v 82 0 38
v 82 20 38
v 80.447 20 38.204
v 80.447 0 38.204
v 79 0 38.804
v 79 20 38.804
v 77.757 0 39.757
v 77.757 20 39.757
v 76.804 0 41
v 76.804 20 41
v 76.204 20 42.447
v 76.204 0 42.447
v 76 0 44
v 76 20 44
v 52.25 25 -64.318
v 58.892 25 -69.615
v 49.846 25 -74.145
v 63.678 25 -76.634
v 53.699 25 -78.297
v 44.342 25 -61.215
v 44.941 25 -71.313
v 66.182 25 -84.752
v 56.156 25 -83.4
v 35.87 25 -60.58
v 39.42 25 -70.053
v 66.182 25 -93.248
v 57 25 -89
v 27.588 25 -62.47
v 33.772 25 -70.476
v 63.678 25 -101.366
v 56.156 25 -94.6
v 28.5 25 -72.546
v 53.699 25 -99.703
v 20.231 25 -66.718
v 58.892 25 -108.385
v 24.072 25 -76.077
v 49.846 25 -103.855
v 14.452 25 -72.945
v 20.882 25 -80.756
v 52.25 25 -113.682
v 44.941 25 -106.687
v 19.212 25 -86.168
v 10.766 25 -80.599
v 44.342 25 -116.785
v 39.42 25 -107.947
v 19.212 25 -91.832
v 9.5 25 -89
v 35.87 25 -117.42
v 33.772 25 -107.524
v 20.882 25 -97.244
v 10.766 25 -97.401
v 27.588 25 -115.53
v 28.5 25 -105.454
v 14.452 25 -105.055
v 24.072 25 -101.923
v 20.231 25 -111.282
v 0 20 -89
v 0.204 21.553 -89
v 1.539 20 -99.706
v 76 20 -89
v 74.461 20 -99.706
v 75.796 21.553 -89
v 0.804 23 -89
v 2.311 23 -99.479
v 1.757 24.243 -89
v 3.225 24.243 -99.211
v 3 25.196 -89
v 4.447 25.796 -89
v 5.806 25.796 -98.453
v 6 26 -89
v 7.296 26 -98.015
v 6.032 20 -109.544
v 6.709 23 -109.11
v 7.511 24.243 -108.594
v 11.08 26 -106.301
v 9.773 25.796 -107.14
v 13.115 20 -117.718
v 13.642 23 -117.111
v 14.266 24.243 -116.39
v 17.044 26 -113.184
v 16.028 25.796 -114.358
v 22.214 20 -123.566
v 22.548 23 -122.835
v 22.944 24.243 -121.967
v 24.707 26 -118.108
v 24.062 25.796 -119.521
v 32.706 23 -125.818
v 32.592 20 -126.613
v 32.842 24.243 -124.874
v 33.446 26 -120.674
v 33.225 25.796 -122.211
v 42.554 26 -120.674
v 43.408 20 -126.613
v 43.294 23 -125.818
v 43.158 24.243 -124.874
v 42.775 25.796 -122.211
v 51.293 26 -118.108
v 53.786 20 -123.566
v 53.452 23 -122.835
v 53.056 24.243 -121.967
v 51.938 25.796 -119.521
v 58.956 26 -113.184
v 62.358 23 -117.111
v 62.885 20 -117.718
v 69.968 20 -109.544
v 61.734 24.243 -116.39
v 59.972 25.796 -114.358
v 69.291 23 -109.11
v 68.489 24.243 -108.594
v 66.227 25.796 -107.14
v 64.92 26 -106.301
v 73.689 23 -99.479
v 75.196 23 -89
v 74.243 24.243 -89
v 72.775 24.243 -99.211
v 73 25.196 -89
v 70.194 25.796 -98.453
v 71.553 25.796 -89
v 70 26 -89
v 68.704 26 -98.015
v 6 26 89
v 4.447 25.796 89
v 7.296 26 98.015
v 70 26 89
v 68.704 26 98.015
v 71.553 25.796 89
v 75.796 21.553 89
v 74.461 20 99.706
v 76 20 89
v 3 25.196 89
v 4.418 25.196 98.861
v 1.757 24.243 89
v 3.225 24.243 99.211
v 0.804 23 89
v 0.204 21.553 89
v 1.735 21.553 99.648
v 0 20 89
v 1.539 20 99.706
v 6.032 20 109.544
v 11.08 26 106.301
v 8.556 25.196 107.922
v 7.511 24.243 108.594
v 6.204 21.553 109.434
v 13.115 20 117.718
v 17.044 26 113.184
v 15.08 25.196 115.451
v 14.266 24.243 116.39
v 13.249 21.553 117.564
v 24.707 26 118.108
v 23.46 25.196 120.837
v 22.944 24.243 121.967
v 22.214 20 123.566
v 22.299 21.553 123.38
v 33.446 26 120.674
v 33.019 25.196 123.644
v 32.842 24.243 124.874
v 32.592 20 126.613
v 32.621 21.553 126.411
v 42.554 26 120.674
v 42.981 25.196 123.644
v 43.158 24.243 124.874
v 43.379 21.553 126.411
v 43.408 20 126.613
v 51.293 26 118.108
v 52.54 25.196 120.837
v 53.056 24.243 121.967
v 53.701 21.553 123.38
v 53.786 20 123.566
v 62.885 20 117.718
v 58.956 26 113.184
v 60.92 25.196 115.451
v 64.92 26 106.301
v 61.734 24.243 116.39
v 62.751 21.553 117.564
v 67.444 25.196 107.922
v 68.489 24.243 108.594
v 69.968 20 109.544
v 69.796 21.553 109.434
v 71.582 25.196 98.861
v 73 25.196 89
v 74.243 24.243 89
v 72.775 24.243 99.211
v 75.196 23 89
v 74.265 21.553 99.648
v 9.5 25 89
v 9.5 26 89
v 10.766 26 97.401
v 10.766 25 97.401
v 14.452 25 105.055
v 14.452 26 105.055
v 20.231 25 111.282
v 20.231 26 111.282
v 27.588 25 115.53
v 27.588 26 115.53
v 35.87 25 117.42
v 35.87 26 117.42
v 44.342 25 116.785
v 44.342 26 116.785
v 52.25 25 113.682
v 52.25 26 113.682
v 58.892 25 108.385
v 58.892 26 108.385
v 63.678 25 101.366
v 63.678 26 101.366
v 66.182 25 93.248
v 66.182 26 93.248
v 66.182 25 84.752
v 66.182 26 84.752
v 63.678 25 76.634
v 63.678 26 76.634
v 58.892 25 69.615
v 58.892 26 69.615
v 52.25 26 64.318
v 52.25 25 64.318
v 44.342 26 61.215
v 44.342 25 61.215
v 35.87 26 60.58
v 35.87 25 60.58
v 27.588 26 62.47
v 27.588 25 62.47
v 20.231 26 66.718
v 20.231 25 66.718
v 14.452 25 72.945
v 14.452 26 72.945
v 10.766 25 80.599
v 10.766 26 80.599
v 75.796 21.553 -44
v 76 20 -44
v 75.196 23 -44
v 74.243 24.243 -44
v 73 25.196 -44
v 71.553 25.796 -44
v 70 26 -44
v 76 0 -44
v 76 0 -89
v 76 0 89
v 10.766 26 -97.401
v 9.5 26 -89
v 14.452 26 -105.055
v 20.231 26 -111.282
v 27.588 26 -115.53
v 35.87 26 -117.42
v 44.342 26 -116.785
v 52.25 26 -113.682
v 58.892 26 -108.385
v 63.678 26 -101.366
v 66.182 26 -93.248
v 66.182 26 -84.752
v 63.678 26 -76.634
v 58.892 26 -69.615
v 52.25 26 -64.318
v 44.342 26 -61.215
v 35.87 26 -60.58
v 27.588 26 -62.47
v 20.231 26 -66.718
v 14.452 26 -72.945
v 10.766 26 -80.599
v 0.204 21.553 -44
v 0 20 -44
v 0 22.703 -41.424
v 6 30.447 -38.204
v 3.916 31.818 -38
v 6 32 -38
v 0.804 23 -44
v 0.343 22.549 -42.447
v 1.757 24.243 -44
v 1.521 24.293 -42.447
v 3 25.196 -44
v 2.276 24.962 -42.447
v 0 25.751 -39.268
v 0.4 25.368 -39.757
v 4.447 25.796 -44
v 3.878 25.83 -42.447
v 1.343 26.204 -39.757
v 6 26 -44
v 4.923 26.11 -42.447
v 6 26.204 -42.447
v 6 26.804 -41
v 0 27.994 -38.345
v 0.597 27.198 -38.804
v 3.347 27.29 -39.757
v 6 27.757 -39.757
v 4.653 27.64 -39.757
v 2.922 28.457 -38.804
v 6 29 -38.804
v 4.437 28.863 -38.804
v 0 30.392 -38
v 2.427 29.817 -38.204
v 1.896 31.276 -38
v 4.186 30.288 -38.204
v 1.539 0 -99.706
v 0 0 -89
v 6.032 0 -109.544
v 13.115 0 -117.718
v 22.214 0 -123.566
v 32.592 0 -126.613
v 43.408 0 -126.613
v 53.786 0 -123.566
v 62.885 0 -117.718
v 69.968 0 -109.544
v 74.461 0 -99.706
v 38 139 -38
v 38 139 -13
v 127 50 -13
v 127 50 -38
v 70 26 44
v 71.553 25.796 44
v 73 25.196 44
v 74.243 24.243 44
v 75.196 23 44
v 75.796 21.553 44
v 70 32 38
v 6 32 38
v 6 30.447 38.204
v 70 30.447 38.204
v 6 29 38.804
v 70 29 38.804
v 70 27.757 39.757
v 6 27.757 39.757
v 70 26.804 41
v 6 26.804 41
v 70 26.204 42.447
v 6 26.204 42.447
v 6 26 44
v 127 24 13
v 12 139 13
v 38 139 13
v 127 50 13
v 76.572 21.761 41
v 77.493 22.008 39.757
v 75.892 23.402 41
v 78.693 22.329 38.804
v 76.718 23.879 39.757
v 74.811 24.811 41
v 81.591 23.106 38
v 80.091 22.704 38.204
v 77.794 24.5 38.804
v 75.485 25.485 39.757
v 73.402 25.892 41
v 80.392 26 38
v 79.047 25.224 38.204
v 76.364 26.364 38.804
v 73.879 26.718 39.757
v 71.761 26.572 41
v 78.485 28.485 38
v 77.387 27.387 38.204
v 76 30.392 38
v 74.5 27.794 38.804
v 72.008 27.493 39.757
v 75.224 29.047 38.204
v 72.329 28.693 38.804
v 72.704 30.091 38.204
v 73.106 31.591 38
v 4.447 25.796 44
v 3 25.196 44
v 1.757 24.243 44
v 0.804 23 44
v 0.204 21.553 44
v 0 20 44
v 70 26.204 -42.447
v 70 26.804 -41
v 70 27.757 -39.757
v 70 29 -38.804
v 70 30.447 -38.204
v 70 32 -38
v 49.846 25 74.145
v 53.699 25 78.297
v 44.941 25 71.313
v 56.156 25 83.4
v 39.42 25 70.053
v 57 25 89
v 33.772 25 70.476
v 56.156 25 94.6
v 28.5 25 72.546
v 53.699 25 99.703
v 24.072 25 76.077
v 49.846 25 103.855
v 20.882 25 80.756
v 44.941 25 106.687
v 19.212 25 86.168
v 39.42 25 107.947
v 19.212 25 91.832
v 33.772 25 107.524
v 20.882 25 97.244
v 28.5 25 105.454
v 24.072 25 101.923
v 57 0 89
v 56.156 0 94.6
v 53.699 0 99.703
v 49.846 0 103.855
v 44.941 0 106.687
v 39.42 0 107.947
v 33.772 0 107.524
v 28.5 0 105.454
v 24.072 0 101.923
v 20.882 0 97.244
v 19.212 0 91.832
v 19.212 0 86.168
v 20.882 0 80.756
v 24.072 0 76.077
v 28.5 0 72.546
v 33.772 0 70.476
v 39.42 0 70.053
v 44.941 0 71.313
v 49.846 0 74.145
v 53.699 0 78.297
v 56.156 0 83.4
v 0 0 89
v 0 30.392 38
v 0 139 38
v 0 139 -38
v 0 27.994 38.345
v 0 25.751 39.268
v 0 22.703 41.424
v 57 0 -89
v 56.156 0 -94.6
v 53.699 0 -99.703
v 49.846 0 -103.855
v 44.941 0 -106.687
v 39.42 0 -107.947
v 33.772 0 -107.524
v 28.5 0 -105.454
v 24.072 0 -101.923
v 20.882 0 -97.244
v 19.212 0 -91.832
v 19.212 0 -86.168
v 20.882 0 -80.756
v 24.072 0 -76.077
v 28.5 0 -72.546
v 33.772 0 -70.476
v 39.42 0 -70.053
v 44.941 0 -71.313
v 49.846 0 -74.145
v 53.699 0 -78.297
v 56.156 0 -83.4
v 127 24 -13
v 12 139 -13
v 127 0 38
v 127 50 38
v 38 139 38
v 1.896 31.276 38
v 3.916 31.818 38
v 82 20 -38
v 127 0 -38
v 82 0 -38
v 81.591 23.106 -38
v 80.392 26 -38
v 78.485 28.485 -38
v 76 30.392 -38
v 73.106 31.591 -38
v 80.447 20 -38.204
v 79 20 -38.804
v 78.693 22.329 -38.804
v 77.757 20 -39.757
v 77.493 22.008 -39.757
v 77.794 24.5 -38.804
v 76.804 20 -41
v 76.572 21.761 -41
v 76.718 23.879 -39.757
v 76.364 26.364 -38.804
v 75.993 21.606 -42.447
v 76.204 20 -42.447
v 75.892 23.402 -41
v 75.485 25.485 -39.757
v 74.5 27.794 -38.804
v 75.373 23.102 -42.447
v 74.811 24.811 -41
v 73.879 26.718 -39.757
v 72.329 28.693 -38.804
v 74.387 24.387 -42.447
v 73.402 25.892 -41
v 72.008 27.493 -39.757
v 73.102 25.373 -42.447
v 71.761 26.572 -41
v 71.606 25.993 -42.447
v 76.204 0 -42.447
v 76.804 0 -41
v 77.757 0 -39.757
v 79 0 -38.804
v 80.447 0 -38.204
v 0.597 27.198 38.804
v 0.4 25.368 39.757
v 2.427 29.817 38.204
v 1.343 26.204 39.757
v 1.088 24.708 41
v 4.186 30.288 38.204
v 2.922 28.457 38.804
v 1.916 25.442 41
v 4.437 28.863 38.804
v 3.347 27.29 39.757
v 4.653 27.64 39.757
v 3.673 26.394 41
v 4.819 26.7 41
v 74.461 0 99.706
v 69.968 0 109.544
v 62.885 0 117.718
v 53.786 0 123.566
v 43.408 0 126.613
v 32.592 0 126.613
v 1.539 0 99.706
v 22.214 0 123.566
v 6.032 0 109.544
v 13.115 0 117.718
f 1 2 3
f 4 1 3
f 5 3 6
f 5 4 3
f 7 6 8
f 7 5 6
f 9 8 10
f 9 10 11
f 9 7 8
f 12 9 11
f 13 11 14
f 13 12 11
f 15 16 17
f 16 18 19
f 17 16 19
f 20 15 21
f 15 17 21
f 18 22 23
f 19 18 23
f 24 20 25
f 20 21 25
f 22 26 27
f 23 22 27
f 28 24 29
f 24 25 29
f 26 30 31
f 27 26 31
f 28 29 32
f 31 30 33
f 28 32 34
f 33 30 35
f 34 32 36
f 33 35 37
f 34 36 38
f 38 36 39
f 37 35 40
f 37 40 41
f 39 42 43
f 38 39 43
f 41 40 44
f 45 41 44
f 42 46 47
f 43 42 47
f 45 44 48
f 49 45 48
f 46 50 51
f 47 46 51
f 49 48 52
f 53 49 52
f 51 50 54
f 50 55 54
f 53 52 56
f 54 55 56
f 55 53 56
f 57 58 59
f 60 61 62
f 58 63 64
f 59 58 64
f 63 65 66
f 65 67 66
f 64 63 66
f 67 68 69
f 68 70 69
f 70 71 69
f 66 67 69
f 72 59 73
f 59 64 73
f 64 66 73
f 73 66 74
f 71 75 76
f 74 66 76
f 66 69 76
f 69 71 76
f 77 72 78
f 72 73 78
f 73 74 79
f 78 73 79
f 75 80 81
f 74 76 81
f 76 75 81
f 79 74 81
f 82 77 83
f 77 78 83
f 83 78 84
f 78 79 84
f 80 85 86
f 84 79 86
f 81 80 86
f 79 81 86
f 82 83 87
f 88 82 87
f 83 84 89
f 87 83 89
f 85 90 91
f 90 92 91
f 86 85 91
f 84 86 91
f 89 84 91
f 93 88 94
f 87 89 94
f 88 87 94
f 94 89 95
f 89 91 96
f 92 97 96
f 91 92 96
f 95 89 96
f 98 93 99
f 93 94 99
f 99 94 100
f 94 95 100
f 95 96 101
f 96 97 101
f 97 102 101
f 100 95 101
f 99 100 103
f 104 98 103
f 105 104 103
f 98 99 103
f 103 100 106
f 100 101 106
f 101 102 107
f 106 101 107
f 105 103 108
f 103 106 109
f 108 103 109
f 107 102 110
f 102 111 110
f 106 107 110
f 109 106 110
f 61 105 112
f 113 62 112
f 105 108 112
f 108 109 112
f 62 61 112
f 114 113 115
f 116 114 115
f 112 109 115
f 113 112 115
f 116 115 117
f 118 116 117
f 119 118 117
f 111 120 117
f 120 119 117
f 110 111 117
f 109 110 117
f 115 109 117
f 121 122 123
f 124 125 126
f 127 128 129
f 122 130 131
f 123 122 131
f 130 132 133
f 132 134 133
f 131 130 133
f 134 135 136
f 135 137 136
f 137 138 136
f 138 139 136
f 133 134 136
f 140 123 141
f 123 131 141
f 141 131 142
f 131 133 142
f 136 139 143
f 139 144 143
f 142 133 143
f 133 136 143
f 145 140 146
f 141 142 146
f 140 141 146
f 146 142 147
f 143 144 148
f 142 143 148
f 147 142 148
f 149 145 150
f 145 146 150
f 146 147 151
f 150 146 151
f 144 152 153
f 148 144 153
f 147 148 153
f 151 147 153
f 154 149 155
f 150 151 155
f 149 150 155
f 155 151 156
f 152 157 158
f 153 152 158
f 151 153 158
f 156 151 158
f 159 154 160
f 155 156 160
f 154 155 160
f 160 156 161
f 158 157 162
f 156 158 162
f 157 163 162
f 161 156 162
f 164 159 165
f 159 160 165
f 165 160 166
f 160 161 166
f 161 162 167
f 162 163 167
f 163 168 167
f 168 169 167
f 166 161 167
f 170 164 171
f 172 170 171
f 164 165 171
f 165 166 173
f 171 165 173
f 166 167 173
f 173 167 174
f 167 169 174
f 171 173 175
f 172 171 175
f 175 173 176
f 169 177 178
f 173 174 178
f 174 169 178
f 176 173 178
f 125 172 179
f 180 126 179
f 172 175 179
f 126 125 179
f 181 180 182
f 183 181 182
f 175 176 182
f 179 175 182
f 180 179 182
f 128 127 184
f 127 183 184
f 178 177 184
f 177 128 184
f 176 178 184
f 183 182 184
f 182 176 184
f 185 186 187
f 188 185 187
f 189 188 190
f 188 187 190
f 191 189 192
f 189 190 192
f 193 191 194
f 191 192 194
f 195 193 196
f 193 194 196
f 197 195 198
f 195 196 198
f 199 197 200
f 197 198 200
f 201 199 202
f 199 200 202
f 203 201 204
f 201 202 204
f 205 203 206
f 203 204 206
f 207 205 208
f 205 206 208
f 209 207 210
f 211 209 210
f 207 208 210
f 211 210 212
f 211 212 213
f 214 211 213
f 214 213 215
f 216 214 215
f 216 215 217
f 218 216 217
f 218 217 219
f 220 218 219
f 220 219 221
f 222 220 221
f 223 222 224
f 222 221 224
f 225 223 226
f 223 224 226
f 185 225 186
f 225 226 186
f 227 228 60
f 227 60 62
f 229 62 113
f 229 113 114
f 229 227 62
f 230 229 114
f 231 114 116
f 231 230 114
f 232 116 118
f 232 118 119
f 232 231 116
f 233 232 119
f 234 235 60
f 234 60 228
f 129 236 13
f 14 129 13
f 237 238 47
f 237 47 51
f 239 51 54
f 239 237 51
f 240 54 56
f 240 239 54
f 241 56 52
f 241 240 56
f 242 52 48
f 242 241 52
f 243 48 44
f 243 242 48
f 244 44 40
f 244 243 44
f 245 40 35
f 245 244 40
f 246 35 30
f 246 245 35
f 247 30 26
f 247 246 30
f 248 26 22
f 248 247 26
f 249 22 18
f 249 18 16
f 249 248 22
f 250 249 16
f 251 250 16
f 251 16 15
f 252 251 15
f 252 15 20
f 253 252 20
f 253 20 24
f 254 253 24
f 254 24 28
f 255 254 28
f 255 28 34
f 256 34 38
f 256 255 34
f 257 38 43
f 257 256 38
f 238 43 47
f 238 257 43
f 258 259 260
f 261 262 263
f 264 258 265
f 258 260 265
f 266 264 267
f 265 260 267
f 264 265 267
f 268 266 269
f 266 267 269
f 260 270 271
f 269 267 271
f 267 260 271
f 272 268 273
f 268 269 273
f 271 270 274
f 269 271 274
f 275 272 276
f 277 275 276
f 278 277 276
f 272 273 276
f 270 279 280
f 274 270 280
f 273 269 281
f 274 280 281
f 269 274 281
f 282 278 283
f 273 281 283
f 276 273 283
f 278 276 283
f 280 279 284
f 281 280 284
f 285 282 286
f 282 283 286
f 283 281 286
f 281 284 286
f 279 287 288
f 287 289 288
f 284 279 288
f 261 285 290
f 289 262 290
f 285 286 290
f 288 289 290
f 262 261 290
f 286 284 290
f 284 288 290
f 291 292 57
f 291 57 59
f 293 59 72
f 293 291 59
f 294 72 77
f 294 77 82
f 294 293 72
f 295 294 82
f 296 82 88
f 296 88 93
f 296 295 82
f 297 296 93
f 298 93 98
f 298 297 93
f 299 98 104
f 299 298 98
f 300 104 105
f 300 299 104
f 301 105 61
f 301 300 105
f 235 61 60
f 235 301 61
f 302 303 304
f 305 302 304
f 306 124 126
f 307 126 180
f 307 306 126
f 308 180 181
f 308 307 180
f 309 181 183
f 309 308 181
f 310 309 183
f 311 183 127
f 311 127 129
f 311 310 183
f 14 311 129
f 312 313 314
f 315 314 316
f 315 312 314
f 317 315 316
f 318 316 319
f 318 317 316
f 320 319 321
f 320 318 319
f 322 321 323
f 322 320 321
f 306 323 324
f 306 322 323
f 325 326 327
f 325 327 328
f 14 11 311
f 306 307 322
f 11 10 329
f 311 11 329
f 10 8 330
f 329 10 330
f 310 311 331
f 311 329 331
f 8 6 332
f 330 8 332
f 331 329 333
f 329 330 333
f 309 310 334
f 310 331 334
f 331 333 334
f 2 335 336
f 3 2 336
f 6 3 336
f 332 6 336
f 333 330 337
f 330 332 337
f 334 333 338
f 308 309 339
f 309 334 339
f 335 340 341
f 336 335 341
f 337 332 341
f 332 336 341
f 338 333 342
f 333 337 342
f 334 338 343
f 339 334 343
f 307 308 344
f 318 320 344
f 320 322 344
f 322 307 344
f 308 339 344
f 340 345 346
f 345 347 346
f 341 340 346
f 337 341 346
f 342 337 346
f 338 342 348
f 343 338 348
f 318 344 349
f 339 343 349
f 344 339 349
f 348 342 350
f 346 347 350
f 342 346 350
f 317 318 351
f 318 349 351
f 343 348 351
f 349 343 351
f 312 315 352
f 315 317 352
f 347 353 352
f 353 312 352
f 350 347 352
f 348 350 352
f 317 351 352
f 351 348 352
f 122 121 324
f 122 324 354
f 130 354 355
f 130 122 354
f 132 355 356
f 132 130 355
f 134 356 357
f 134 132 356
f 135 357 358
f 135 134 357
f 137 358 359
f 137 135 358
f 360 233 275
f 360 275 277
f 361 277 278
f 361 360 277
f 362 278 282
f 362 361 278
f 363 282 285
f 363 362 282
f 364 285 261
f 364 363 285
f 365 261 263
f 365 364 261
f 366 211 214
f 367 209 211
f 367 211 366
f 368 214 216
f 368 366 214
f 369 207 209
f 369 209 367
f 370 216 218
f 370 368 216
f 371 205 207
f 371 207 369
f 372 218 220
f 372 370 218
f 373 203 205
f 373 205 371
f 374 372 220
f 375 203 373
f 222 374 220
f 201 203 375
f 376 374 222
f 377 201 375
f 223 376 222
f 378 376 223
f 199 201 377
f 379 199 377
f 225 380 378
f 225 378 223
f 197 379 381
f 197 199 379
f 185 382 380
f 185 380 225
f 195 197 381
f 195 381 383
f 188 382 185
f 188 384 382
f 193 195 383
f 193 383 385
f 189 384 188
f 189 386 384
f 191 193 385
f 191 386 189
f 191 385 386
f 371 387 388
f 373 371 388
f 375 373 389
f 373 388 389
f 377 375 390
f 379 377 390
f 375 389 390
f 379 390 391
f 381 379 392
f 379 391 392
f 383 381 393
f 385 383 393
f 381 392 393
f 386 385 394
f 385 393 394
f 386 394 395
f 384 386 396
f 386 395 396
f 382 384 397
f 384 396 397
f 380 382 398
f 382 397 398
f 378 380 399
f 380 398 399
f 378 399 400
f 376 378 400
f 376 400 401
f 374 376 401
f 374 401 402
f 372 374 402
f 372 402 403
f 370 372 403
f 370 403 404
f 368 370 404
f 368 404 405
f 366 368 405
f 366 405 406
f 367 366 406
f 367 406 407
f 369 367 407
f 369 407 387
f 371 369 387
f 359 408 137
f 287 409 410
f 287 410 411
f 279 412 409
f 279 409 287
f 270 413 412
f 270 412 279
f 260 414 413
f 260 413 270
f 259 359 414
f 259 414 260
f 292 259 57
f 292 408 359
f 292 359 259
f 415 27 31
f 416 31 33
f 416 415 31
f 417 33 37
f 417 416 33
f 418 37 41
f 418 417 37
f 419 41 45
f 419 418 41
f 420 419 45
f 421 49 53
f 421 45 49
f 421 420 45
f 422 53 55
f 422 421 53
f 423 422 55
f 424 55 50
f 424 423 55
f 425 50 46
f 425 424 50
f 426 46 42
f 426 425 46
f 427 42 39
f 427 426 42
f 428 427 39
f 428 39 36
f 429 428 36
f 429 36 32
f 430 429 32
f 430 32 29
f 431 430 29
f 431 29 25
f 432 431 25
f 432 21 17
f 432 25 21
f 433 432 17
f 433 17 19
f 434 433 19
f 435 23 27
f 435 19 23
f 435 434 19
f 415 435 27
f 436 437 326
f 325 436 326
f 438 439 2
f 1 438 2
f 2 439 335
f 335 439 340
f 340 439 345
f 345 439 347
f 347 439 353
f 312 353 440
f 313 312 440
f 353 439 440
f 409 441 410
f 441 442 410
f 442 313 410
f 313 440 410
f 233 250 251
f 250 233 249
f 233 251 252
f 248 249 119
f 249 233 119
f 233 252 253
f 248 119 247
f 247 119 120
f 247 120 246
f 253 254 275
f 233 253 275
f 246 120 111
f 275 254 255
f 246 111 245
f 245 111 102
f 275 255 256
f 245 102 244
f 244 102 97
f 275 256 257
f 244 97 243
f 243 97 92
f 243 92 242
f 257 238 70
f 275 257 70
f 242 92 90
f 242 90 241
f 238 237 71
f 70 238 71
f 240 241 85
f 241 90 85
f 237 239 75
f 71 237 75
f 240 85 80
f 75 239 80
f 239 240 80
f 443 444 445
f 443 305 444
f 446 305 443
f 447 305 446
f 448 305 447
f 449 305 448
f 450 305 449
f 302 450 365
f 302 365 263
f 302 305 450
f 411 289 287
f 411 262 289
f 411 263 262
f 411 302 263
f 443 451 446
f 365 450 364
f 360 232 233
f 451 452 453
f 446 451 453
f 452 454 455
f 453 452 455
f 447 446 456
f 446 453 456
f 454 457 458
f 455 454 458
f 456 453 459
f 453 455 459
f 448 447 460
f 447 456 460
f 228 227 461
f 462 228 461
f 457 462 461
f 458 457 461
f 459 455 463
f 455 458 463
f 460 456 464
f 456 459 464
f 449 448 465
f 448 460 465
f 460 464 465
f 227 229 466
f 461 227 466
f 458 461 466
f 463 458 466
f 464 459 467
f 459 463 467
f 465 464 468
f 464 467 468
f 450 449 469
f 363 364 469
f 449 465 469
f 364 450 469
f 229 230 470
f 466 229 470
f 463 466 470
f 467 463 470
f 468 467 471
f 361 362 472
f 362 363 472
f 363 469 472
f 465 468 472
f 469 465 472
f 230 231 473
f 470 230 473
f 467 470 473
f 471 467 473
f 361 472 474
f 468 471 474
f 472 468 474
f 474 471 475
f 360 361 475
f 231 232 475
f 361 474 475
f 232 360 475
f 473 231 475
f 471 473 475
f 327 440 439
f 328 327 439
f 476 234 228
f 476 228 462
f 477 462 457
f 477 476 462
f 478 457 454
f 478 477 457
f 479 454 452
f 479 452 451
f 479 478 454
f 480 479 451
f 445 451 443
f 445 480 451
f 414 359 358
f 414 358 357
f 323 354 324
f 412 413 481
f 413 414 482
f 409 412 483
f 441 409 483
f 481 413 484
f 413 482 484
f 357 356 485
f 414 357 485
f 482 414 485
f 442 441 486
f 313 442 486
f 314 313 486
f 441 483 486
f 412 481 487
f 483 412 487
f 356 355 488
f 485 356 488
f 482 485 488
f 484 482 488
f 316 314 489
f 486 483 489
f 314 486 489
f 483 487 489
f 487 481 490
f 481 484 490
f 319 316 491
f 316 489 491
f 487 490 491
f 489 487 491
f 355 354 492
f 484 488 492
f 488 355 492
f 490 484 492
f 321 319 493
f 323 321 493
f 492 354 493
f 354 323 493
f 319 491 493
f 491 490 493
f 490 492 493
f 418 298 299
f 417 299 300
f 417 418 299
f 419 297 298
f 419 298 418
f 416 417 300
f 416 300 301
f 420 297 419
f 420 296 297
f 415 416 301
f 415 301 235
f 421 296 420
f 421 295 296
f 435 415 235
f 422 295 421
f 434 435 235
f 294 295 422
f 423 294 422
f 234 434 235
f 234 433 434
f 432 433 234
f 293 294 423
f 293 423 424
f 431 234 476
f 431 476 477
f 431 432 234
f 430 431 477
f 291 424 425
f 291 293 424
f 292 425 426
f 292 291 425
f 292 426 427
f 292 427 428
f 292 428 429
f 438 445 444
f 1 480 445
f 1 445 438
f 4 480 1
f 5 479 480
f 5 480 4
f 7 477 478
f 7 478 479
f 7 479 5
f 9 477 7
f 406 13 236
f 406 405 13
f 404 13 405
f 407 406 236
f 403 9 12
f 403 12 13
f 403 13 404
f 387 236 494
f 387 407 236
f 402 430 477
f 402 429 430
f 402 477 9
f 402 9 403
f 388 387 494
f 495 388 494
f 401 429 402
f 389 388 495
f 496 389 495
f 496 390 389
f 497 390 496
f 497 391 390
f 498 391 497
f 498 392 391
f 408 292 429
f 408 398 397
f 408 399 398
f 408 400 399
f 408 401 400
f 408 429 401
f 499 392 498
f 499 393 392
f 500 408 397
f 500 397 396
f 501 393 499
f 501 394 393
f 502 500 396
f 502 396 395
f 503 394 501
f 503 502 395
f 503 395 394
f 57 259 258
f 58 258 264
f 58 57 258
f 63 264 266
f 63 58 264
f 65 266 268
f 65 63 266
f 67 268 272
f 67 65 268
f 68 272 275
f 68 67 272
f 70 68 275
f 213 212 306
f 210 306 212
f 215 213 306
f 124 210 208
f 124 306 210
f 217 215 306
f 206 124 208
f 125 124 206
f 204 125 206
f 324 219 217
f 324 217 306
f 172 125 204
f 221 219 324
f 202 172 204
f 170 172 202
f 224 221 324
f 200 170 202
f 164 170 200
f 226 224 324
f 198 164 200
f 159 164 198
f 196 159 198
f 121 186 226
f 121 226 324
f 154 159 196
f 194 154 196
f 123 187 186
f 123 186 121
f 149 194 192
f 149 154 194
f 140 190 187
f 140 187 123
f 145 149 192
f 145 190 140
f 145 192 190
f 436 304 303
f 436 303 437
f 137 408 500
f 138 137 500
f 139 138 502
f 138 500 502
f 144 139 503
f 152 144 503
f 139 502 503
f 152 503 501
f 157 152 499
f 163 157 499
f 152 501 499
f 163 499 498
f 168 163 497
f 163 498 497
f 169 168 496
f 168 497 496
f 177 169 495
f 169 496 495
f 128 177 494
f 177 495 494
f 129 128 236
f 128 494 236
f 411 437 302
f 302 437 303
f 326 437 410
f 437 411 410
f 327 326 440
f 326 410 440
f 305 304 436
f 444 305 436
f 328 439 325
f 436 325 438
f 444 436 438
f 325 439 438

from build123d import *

# Parameters (mm, degrees)
SALIENTE_EXTRUIR1_DEPTH  = 38
CORTAR_EXTRUIR1_DEPTH    = 273.053680503
CROQUIS3_R               = 19
SALIENTE_EXTRUIR3_DEPTH  = 26
REDONDEO1_R              = 6
CROQUIS4_R               = 28.5
CORTAR_EXTRUIR2_DEPTH    = 1
REDONDEO1_OF_SIMETR_A1_R = 6
REDONDEO2_R              = 6


with BuildPart() as part:
    # Croquis1 → Saliente-Extruir1 (new, symmetric)
    with BuildSketch(Plane.XY):
        Polygon((0, 0), (0, 139), (38, 139), (127, 50), (127, 0), align=None)
    extrude(amount=SALIENTE_EXTRUIR1_DEPTH, both=True)

    # Croquis2 → Cortar-Extruir1 (cut, through all, along a direction that is not the sketch's normal)
    with BuildSketch(Plane(origin=(0, 139, 0), x_dir=(1, 0, 0), z_dir=(0, 1, 0))):
        Polygon((38, 0), (38, 13), (12, 13), (12, -13), (38, -13), align=None)
    extrude(amount=-CORTAR_EXTRUIR1_DEPTH, dir=(-0.7071067811865515, 0.7071067811865436, 0), mode=Mode.SUBTRACT)

    # Croquis3 → Saliente-Extruir3 (add)
    with BuildSketch(Plane.XZ):
        with BuildLine():
            Line((0, 38), (0, 89))
            ThreePointArc((0, 89), (38, 127), (76, 89))
            Line((76, 89), (76, 38))
            Line((76, 38), (0, 38))
        make_face()
        with Locations((38, 89)):
            Circle(CROQUIS3_R, mode=Mode.SUBTRACT)
    saliente_extruir3 = extrude(amount=-SALIENTE_EXTRUIR3_DEPTH)

    # Redondeo1
    redondeo1_edges = [part.edges().sort_by_distance(p)[0] for p in [
        (38, 26, 127),
        (76, 26, 63.5),
        (0, 26, 63.5),
    ]]
    fillet(redondeo1_edges, radius=REDONDEO1_R)

    # Croquis4 → Cortar-Extruir2 (cut)
    with BuildSketch(Plane(origin=(0, 26, 0), x_dir=(1, 0, 0), z_dir=(0, 1, 0))):
        with Locations(Location((38, -89, 0), (0, 0, 180))):
            Circle(CROQUIS4_R)
    cortar_extruir2 = extrude(amount=-CORTAR_EXTRUIR2_DEPTH, mode=Mode.SUBTRACT)

    # Simetría1: Saliente-Extruir3, Cortar-Extruir2 across plane
    add(saliente_extruir3.mirror(Plane.XY))
    add(cortar_extruir2.mirror(Plane.XY), mode=Mode.SUBTRACT)

    # Redondeo1 of Simetría1
    redondeo1_of_simetr_a1_edges = [part.edges().sort_by_distance(p)[0] for p in [
        (38, 26, -127),
        (76, 26, -63.5),
        (0, 26, -63.5),
    ]]
    fillet(redondeo1_of_simetr_a1_edges, radius=REDONDEO1_OF_SIMETR_A1_R)

    # Redondeo2
    # the kernel refuses this fillet: 6 mm, written as the material it adds along each edge
    with BuildSketch(Plane(origin=(70, 26, 38), x_dir=(0, 0, 1), z_dir=(-1, 0, 0))) as redondeo2_piece_1:
        with BuildLine():
            CenterArc((REDONDEO2_R, REDONDEO2_R), REDONDEO2_R, 180, 90)
            Line((0, REDONDEO2_R), (0, 0))
            Line((0, 0), (REDONDEO2_R, 0))
        make_face()
    extrude(amount=64)
    with BuildSketch(Plane(origin=(76, 0, 38), x_dir=(0, 0, 1), z_dir=(0, 1, 0))) as redondeo2_piece_2:
        with BuildLine():
            CenterArc((REDONDEO2_R, REDONDEO2_R), REDONDEO2_R, 180, 90)
            Line((0, REDONDEO2_R), (0, 0))
            Line((0, 0), (REDONDEO2_R, 0))
        make_face()
    extrude(amount=20)
    with BuildSketch(Plane(origin=(6, 20, 38), x_dir=(0.8017442392976484, -0.5976672776328276, 0), z_dir=(0.5976672776328276, 0.8017442392976484, 0))) as redondeo2_piece_3_section:
        with BuildLine():
            CenterArc((6 + REDONDEO2_R, -REDONDEO2_R), REDONDEO2_R, 90, 90)
            Line((6 + REDONDEO2_R, 0), (6, 0))
            Line((6, 0), (6, -REDONDEO2_R))
        make_face()
    redondeo2_piece_3 = revolve(axis=Axis((6, 20, 38), (0, 0, -1)), revolution_arc=233.296989237, mode=Mode.PRIVATE)
    redondeo2_piece_3 = split(redondeo2_piece_3, bisect_by=Plane(origin=(0, 24.499633638, 39.86976996), z_dir=(1, 0, 0)), keep=Keep.TOP, mode=Mode.PRIVATE)
    add(redondeo2_piece_3)
    with BuildSketch(Plane(origin=(70, 20, 38), x_dir=(1, 0, 0), z_dir=(0, -1, 0))) as redondeo2_piece_4:
        with BuildLine():
            CenterArc((6 + REDONDEO2_R, REDONDEO2_R), REDONDEO2_R, 180, 90)
            Line((6 + REDONDEO2_R, 0), (6, 0))
            Line((6, 0), (6, REDONDEO2_R))
        make_face()
    revolve(axis=Axis((70, 20, 38), (0, 0, 1)), revolution_arc=90)
    with BuildSketch(Plane(origin=(70, 26, -38), x_dir=(0, 0, -1), z_dir=(-1, 0, 0))) as redondeo2_piece_5:
        with BuildLine():
            CenterArc((REDONDEO2_R, -REDONDEO2_R), REDONDEO2_R, 90, 90)
            Line((0, -REDONDEO2_R), (0, 0))
            Line((0, 0), (REDONDEO2_R, 0))
        make_face()
    extrude(amount=64)
    with BuildSketch(Plane(origin=(76, 0, -38), x_dir=(0, 0, -1), z_dir=(0, 1, 0))) as redondeo2_piece_6:
        with BuildLine():
            CenterArc((REDONDEO2_R, -REDONDEO2_R), REDONDEO2_R, 90, 90)
            Line((0, -REDONDEO2_R), (0, 0))
            Line((0, 0), (REDONDEO2_R, 0))
        make_face()
    extrude(amount=20)
    with BuildSketch(Plane(origin=(6, 20, -38), x_dir=(0.8017442392976486, -0.5976672776328271, 0), z_dir=(0.5976672776328271, 0.8017442392976486, 0))) as redondeo2_piece_7_section:
        with BuildLine():
            CenterArc((6 + REDONDEO2_R, REDONDEO2_R), REDONDEO2_R, 180, 90)
            Line((6, REDONDEO2_R), (6, 0))
            Line((6, 0), (6 + REDONDEO2_R, 0))
        make_face()
    redondeo2_piece_7 = revolve(axis=Axis((6, 20, -38), (0, 0, -1)), revolution_arc=233.296989237, mode=Mode.PRIVATE)
    redondeo2_piece_7 = split(redondeo2_piece_7, bisect_by=Plane(origin=(0, 24.499633653, -39.869769899), z_dir=(1, 0, 0)), keep=Keep.TOP, mode=Mode.PRIVATE)
    add(redondeo2_piece_7)
    with BuildSketch(Plane(origin=(70, 20, -38), x_dir=(1, 0, 0), z_dir=(0, -1, 0))) as redondeo2_piece_8:
        with BuildLine():
            CenterArc((6 + REDONDEO2_R, -REDONDEO2_R), REDONDEO2_R, 90, 90)
            Line((6 + REDONDEO2_R, 0), (6, 0))
            Line((6, 0), (6, -REDONDEO2_R))
        make_face()
    revolve(axis=Axis((70, 20, -38), (0, 0, 1)), revolution_arc=90)


solid = part.part
